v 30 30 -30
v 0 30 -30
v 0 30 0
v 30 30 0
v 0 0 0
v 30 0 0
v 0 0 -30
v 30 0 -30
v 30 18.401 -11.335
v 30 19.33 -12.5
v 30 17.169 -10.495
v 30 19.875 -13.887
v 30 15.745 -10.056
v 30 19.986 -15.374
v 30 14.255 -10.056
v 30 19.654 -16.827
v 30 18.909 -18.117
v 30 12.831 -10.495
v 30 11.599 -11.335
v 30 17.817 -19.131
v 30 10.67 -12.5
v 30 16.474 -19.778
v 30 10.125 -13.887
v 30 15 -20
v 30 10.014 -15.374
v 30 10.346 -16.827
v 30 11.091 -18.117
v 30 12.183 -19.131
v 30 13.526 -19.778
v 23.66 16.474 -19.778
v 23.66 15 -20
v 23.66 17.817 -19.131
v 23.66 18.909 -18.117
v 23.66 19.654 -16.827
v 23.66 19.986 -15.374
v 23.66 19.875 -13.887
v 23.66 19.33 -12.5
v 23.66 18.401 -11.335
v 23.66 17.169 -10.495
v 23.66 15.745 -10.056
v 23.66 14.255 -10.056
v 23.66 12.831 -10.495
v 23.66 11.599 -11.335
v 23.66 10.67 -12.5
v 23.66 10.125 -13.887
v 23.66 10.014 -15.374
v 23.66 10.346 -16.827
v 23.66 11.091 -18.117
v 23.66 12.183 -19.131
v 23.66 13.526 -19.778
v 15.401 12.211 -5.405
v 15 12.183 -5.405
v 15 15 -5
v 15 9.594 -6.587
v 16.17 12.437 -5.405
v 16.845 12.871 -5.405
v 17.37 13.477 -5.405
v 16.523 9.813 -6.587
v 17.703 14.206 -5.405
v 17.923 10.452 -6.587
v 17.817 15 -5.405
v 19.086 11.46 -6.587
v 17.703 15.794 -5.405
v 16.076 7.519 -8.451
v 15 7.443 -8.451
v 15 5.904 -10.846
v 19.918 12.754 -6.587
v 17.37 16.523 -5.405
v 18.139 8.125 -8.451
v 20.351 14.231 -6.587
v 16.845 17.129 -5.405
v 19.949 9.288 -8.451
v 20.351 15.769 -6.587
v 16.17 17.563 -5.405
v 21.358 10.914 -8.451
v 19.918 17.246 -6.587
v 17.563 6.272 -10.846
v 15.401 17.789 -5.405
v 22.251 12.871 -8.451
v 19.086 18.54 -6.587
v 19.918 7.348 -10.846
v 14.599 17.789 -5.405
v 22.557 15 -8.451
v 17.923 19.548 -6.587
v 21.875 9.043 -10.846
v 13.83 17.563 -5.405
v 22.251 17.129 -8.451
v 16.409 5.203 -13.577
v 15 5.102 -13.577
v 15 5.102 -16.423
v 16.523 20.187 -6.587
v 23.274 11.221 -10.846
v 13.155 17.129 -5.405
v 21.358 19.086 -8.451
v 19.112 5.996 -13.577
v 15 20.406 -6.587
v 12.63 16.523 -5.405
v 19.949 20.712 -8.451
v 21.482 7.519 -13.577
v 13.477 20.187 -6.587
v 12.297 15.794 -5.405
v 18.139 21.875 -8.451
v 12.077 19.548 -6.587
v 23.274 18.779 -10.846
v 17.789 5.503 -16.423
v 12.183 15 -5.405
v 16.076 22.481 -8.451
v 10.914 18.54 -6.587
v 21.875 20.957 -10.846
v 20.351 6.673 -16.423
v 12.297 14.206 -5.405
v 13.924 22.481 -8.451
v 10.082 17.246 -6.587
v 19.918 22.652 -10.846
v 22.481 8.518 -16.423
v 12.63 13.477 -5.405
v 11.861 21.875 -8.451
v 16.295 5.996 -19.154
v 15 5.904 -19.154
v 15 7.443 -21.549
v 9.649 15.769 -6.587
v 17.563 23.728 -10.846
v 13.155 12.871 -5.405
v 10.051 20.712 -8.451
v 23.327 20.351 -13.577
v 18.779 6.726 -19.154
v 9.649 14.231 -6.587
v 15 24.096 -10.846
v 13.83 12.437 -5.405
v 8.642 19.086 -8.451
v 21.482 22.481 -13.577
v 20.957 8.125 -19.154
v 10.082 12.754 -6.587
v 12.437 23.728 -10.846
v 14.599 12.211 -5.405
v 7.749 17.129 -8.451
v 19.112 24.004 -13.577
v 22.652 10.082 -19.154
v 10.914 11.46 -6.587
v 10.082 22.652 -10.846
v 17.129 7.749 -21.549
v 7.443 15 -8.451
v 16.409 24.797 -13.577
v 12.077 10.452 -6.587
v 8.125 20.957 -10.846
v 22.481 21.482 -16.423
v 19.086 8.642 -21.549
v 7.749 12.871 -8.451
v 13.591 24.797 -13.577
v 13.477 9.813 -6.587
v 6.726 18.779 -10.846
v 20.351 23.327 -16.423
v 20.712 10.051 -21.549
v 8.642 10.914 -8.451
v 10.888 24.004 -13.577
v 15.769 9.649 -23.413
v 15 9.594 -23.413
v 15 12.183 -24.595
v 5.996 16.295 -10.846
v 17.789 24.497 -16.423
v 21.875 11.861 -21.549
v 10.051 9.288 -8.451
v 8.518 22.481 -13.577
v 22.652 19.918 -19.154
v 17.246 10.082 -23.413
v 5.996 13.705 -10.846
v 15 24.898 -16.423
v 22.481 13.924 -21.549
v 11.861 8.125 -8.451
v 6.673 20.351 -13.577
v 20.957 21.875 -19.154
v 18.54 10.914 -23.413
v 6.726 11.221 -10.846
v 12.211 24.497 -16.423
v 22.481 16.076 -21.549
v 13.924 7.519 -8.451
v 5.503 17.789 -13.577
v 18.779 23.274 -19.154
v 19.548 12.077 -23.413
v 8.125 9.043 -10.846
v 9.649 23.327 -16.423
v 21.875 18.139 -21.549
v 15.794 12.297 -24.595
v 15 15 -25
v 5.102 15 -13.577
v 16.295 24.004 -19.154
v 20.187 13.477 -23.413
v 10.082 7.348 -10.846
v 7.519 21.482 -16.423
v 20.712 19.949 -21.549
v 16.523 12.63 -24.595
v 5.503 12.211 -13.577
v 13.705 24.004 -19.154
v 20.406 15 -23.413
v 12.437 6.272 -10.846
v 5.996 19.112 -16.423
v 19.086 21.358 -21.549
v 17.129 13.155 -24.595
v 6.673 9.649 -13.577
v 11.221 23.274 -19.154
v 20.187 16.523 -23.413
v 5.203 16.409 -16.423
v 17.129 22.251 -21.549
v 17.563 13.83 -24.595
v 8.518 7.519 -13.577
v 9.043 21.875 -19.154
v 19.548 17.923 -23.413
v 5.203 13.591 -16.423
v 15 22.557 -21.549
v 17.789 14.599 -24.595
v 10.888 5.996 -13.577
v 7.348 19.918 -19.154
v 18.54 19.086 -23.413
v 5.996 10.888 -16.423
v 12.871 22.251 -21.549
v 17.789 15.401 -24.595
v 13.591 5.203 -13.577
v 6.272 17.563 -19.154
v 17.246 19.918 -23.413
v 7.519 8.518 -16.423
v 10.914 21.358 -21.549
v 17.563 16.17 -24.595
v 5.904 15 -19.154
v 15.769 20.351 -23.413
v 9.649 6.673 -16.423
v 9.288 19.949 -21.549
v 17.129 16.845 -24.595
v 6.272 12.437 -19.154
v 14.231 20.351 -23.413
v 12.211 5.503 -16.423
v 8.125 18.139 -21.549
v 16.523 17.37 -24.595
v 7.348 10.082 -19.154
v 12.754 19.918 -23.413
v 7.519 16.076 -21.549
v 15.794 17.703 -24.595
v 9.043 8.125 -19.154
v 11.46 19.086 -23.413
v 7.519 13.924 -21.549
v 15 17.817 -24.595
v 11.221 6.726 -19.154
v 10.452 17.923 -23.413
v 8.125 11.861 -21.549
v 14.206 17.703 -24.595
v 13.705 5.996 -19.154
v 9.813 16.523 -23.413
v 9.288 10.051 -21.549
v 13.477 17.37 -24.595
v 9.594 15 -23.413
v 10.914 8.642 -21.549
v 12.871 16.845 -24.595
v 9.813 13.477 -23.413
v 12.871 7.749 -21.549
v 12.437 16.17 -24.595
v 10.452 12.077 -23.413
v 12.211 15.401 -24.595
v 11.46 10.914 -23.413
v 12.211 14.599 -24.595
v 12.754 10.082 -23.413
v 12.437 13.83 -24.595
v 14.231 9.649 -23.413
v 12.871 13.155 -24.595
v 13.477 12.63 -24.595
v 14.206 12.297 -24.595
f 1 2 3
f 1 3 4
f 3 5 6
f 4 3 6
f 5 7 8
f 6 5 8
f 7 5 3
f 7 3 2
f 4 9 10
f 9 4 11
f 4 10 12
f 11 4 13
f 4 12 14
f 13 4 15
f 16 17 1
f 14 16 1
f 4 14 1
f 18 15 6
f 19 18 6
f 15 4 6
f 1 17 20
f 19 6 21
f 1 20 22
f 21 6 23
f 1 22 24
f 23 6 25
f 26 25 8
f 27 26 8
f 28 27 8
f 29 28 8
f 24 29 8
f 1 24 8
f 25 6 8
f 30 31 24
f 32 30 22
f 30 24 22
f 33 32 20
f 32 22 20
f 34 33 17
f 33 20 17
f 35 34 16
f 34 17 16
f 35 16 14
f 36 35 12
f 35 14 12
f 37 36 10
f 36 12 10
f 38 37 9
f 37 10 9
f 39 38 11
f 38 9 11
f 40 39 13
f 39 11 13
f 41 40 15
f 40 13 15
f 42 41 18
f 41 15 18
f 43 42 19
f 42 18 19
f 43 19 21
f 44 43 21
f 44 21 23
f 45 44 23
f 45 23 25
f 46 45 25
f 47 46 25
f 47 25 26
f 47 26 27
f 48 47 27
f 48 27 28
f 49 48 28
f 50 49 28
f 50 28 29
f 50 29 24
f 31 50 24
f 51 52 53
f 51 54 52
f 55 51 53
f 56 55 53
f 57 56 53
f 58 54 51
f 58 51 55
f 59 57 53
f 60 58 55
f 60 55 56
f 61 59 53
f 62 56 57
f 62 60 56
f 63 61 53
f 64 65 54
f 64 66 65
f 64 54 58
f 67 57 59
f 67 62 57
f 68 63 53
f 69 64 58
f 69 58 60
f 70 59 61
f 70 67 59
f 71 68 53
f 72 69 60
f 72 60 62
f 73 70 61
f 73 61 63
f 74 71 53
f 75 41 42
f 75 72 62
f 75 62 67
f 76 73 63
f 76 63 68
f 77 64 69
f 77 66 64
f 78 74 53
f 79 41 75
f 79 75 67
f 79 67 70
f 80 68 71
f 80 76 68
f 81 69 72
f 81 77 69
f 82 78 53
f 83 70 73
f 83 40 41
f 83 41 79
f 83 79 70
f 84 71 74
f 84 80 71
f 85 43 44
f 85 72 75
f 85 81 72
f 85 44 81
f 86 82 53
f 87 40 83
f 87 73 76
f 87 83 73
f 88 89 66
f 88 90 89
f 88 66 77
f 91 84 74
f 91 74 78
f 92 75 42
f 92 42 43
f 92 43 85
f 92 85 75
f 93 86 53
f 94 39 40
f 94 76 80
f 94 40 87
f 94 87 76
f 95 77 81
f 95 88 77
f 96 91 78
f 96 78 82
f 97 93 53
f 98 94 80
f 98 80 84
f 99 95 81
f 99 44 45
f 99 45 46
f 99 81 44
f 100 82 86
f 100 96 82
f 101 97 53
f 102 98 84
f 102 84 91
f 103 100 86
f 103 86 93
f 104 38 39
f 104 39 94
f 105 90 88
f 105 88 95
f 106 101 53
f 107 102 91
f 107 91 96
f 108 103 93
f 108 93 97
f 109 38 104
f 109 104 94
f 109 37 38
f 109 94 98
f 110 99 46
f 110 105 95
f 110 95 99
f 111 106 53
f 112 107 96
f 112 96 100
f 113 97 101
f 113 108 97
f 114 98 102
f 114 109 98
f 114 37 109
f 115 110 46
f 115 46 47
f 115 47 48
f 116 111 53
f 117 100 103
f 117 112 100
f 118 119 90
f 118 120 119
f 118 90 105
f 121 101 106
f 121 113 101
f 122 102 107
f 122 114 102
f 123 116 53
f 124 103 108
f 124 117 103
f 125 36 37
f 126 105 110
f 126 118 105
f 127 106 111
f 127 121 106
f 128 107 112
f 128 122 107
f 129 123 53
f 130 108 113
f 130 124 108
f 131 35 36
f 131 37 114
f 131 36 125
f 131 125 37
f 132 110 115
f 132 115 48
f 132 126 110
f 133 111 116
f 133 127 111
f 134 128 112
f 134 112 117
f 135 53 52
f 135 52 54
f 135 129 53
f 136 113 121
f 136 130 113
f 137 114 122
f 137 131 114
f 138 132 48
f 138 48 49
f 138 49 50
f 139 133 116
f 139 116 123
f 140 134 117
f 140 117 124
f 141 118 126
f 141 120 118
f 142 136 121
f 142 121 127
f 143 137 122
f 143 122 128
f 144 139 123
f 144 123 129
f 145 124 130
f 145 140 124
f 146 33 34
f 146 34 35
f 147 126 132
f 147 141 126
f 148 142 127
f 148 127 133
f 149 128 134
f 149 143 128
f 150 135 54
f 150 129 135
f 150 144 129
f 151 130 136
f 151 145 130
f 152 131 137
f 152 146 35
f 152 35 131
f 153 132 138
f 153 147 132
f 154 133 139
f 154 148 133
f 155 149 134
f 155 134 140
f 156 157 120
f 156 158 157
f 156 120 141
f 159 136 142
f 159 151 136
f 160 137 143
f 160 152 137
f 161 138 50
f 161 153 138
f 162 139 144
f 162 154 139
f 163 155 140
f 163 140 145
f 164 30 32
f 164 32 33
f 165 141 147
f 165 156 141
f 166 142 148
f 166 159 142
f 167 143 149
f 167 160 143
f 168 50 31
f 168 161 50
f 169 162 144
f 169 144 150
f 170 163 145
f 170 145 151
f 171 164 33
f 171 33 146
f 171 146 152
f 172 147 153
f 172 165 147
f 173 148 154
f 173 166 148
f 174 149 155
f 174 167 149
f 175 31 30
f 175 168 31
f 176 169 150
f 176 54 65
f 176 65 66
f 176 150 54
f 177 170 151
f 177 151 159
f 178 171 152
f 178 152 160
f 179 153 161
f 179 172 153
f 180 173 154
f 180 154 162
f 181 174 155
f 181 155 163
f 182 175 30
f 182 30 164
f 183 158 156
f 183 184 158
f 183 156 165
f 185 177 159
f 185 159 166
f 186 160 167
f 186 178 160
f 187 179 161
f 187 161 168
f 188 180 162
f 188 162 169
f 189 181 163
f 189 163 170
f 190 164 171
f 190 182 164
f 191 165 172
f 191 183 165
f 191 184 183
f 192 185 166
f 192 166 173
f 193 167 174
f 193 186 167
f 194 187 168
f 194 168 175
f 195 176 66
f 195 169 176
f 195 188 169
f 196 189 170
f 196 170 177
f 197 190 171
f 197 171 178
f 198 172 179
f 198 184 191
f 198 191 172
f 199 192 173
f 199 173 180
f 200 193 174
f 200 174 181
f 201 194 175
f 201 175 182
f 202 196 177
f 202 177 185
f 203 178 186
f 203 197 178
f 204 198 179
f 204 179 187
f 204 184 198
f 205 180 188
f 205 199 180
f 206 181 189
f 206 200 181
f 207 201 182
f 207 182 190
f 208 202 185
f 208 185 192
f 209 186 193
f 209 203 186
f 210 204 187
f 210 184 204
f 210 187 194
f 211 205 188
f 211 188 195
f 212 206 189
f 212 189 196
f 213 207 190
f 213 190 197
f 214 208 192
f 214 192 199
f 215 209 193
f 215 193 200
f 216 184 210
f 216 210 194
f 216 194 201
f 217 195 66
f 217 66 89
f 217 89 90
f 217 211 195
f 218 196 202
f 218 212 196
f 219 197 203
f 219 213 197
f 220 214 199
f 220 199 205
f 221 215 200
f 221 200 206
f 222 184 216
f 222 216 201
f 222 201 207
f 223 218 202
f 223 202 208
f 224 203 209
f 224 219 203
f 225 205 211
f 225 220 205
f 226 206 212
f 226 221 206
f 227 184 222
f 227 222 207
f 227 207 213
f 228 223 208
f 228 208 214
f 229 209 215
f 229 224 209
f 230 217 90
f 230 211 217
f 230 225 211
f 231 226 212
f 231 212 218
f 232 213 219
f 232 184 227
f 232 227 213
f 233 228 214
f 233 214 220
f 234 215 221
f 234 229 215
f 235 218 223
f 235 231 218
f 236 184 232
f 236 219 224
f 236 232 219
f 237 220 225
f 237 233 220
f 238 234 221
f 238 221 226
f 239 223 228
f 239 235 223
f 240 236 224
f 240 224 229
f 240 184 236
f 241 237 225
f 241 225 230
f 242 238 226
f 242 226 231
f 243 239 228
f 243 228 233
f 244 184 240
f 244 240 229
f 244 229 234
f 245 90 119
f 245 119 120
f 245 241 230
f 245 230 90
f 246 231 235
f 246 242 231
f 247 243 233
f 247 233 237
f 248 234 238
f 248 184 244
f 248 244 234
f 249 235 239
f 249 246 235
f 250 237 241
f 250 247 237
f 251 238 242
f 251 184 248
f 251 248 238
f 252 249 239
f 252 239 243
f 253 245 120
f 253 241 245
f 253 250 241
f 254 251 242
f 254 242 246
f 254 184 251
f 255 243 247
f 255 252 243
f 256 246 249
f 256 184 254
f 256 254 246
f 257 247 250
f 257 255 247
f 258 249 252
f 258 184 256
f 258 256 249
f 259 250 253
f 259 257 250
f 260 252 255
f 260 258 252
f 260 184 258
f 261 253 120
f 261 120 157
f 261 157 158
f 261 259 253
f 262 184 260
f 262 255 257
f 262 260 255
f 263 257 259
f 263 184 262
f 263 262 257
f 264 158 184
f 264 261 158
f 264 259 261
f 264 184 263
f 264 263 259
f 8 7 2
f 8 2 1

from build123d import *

# Parameters (mm, degrees)
SKETCH1_W           = 30
SKETCH1_H           = 30
BOSS_EXTRUDE1_DEPTH = 30
SKETCH2_R           = 5
CUT_EXTRUDE1_DEPTH  = 15


with BuildPart() as part:
    # Sketch1 → Boss-Extrude1 (new body)
    with BuildSketch(Plane(origin=(0, 0, 0), x_dir=(1, 0, 0), z_dir=(0, 1, 0))):
        with Locations((15, 15)):
            Rectangle(SKETCH1_W, SKETCH1_H)
    extrude(amount=BOSS_EXTRUDE1_DEPTH)

    # Sketch2 → Cut-Extrude1 (cut)
    with BuildSketch(Plane(origin=(30, 0, 0), x_dir=(0, 0, -1), z_dir=(1, 0, 0))):
        with Locations((15, 15)):
            Circle(SKETCH2_R)
    extrude(amount=-CUT_EXTRUDE1_DEPTH, mode=Mode.SUBTRACT)

    # Sketch4 → Cut-Revolve1 (revolve, cut)
    with BuildSketch(Plane(origin=(15, 0, 0), x_dir=(0, 0, -1), z_dir=(1, 0, 0))):
        with BuildLine():
            Line((25, 15), (5, 15))
            ThreePointArc((5, 15), (15, 5), (25, 15))
        make_face()
    revolve(axis=Axis((15, 15, -25), (0, 0, 1)), mode=Mode.SUBTRACT)


solid = part.part
